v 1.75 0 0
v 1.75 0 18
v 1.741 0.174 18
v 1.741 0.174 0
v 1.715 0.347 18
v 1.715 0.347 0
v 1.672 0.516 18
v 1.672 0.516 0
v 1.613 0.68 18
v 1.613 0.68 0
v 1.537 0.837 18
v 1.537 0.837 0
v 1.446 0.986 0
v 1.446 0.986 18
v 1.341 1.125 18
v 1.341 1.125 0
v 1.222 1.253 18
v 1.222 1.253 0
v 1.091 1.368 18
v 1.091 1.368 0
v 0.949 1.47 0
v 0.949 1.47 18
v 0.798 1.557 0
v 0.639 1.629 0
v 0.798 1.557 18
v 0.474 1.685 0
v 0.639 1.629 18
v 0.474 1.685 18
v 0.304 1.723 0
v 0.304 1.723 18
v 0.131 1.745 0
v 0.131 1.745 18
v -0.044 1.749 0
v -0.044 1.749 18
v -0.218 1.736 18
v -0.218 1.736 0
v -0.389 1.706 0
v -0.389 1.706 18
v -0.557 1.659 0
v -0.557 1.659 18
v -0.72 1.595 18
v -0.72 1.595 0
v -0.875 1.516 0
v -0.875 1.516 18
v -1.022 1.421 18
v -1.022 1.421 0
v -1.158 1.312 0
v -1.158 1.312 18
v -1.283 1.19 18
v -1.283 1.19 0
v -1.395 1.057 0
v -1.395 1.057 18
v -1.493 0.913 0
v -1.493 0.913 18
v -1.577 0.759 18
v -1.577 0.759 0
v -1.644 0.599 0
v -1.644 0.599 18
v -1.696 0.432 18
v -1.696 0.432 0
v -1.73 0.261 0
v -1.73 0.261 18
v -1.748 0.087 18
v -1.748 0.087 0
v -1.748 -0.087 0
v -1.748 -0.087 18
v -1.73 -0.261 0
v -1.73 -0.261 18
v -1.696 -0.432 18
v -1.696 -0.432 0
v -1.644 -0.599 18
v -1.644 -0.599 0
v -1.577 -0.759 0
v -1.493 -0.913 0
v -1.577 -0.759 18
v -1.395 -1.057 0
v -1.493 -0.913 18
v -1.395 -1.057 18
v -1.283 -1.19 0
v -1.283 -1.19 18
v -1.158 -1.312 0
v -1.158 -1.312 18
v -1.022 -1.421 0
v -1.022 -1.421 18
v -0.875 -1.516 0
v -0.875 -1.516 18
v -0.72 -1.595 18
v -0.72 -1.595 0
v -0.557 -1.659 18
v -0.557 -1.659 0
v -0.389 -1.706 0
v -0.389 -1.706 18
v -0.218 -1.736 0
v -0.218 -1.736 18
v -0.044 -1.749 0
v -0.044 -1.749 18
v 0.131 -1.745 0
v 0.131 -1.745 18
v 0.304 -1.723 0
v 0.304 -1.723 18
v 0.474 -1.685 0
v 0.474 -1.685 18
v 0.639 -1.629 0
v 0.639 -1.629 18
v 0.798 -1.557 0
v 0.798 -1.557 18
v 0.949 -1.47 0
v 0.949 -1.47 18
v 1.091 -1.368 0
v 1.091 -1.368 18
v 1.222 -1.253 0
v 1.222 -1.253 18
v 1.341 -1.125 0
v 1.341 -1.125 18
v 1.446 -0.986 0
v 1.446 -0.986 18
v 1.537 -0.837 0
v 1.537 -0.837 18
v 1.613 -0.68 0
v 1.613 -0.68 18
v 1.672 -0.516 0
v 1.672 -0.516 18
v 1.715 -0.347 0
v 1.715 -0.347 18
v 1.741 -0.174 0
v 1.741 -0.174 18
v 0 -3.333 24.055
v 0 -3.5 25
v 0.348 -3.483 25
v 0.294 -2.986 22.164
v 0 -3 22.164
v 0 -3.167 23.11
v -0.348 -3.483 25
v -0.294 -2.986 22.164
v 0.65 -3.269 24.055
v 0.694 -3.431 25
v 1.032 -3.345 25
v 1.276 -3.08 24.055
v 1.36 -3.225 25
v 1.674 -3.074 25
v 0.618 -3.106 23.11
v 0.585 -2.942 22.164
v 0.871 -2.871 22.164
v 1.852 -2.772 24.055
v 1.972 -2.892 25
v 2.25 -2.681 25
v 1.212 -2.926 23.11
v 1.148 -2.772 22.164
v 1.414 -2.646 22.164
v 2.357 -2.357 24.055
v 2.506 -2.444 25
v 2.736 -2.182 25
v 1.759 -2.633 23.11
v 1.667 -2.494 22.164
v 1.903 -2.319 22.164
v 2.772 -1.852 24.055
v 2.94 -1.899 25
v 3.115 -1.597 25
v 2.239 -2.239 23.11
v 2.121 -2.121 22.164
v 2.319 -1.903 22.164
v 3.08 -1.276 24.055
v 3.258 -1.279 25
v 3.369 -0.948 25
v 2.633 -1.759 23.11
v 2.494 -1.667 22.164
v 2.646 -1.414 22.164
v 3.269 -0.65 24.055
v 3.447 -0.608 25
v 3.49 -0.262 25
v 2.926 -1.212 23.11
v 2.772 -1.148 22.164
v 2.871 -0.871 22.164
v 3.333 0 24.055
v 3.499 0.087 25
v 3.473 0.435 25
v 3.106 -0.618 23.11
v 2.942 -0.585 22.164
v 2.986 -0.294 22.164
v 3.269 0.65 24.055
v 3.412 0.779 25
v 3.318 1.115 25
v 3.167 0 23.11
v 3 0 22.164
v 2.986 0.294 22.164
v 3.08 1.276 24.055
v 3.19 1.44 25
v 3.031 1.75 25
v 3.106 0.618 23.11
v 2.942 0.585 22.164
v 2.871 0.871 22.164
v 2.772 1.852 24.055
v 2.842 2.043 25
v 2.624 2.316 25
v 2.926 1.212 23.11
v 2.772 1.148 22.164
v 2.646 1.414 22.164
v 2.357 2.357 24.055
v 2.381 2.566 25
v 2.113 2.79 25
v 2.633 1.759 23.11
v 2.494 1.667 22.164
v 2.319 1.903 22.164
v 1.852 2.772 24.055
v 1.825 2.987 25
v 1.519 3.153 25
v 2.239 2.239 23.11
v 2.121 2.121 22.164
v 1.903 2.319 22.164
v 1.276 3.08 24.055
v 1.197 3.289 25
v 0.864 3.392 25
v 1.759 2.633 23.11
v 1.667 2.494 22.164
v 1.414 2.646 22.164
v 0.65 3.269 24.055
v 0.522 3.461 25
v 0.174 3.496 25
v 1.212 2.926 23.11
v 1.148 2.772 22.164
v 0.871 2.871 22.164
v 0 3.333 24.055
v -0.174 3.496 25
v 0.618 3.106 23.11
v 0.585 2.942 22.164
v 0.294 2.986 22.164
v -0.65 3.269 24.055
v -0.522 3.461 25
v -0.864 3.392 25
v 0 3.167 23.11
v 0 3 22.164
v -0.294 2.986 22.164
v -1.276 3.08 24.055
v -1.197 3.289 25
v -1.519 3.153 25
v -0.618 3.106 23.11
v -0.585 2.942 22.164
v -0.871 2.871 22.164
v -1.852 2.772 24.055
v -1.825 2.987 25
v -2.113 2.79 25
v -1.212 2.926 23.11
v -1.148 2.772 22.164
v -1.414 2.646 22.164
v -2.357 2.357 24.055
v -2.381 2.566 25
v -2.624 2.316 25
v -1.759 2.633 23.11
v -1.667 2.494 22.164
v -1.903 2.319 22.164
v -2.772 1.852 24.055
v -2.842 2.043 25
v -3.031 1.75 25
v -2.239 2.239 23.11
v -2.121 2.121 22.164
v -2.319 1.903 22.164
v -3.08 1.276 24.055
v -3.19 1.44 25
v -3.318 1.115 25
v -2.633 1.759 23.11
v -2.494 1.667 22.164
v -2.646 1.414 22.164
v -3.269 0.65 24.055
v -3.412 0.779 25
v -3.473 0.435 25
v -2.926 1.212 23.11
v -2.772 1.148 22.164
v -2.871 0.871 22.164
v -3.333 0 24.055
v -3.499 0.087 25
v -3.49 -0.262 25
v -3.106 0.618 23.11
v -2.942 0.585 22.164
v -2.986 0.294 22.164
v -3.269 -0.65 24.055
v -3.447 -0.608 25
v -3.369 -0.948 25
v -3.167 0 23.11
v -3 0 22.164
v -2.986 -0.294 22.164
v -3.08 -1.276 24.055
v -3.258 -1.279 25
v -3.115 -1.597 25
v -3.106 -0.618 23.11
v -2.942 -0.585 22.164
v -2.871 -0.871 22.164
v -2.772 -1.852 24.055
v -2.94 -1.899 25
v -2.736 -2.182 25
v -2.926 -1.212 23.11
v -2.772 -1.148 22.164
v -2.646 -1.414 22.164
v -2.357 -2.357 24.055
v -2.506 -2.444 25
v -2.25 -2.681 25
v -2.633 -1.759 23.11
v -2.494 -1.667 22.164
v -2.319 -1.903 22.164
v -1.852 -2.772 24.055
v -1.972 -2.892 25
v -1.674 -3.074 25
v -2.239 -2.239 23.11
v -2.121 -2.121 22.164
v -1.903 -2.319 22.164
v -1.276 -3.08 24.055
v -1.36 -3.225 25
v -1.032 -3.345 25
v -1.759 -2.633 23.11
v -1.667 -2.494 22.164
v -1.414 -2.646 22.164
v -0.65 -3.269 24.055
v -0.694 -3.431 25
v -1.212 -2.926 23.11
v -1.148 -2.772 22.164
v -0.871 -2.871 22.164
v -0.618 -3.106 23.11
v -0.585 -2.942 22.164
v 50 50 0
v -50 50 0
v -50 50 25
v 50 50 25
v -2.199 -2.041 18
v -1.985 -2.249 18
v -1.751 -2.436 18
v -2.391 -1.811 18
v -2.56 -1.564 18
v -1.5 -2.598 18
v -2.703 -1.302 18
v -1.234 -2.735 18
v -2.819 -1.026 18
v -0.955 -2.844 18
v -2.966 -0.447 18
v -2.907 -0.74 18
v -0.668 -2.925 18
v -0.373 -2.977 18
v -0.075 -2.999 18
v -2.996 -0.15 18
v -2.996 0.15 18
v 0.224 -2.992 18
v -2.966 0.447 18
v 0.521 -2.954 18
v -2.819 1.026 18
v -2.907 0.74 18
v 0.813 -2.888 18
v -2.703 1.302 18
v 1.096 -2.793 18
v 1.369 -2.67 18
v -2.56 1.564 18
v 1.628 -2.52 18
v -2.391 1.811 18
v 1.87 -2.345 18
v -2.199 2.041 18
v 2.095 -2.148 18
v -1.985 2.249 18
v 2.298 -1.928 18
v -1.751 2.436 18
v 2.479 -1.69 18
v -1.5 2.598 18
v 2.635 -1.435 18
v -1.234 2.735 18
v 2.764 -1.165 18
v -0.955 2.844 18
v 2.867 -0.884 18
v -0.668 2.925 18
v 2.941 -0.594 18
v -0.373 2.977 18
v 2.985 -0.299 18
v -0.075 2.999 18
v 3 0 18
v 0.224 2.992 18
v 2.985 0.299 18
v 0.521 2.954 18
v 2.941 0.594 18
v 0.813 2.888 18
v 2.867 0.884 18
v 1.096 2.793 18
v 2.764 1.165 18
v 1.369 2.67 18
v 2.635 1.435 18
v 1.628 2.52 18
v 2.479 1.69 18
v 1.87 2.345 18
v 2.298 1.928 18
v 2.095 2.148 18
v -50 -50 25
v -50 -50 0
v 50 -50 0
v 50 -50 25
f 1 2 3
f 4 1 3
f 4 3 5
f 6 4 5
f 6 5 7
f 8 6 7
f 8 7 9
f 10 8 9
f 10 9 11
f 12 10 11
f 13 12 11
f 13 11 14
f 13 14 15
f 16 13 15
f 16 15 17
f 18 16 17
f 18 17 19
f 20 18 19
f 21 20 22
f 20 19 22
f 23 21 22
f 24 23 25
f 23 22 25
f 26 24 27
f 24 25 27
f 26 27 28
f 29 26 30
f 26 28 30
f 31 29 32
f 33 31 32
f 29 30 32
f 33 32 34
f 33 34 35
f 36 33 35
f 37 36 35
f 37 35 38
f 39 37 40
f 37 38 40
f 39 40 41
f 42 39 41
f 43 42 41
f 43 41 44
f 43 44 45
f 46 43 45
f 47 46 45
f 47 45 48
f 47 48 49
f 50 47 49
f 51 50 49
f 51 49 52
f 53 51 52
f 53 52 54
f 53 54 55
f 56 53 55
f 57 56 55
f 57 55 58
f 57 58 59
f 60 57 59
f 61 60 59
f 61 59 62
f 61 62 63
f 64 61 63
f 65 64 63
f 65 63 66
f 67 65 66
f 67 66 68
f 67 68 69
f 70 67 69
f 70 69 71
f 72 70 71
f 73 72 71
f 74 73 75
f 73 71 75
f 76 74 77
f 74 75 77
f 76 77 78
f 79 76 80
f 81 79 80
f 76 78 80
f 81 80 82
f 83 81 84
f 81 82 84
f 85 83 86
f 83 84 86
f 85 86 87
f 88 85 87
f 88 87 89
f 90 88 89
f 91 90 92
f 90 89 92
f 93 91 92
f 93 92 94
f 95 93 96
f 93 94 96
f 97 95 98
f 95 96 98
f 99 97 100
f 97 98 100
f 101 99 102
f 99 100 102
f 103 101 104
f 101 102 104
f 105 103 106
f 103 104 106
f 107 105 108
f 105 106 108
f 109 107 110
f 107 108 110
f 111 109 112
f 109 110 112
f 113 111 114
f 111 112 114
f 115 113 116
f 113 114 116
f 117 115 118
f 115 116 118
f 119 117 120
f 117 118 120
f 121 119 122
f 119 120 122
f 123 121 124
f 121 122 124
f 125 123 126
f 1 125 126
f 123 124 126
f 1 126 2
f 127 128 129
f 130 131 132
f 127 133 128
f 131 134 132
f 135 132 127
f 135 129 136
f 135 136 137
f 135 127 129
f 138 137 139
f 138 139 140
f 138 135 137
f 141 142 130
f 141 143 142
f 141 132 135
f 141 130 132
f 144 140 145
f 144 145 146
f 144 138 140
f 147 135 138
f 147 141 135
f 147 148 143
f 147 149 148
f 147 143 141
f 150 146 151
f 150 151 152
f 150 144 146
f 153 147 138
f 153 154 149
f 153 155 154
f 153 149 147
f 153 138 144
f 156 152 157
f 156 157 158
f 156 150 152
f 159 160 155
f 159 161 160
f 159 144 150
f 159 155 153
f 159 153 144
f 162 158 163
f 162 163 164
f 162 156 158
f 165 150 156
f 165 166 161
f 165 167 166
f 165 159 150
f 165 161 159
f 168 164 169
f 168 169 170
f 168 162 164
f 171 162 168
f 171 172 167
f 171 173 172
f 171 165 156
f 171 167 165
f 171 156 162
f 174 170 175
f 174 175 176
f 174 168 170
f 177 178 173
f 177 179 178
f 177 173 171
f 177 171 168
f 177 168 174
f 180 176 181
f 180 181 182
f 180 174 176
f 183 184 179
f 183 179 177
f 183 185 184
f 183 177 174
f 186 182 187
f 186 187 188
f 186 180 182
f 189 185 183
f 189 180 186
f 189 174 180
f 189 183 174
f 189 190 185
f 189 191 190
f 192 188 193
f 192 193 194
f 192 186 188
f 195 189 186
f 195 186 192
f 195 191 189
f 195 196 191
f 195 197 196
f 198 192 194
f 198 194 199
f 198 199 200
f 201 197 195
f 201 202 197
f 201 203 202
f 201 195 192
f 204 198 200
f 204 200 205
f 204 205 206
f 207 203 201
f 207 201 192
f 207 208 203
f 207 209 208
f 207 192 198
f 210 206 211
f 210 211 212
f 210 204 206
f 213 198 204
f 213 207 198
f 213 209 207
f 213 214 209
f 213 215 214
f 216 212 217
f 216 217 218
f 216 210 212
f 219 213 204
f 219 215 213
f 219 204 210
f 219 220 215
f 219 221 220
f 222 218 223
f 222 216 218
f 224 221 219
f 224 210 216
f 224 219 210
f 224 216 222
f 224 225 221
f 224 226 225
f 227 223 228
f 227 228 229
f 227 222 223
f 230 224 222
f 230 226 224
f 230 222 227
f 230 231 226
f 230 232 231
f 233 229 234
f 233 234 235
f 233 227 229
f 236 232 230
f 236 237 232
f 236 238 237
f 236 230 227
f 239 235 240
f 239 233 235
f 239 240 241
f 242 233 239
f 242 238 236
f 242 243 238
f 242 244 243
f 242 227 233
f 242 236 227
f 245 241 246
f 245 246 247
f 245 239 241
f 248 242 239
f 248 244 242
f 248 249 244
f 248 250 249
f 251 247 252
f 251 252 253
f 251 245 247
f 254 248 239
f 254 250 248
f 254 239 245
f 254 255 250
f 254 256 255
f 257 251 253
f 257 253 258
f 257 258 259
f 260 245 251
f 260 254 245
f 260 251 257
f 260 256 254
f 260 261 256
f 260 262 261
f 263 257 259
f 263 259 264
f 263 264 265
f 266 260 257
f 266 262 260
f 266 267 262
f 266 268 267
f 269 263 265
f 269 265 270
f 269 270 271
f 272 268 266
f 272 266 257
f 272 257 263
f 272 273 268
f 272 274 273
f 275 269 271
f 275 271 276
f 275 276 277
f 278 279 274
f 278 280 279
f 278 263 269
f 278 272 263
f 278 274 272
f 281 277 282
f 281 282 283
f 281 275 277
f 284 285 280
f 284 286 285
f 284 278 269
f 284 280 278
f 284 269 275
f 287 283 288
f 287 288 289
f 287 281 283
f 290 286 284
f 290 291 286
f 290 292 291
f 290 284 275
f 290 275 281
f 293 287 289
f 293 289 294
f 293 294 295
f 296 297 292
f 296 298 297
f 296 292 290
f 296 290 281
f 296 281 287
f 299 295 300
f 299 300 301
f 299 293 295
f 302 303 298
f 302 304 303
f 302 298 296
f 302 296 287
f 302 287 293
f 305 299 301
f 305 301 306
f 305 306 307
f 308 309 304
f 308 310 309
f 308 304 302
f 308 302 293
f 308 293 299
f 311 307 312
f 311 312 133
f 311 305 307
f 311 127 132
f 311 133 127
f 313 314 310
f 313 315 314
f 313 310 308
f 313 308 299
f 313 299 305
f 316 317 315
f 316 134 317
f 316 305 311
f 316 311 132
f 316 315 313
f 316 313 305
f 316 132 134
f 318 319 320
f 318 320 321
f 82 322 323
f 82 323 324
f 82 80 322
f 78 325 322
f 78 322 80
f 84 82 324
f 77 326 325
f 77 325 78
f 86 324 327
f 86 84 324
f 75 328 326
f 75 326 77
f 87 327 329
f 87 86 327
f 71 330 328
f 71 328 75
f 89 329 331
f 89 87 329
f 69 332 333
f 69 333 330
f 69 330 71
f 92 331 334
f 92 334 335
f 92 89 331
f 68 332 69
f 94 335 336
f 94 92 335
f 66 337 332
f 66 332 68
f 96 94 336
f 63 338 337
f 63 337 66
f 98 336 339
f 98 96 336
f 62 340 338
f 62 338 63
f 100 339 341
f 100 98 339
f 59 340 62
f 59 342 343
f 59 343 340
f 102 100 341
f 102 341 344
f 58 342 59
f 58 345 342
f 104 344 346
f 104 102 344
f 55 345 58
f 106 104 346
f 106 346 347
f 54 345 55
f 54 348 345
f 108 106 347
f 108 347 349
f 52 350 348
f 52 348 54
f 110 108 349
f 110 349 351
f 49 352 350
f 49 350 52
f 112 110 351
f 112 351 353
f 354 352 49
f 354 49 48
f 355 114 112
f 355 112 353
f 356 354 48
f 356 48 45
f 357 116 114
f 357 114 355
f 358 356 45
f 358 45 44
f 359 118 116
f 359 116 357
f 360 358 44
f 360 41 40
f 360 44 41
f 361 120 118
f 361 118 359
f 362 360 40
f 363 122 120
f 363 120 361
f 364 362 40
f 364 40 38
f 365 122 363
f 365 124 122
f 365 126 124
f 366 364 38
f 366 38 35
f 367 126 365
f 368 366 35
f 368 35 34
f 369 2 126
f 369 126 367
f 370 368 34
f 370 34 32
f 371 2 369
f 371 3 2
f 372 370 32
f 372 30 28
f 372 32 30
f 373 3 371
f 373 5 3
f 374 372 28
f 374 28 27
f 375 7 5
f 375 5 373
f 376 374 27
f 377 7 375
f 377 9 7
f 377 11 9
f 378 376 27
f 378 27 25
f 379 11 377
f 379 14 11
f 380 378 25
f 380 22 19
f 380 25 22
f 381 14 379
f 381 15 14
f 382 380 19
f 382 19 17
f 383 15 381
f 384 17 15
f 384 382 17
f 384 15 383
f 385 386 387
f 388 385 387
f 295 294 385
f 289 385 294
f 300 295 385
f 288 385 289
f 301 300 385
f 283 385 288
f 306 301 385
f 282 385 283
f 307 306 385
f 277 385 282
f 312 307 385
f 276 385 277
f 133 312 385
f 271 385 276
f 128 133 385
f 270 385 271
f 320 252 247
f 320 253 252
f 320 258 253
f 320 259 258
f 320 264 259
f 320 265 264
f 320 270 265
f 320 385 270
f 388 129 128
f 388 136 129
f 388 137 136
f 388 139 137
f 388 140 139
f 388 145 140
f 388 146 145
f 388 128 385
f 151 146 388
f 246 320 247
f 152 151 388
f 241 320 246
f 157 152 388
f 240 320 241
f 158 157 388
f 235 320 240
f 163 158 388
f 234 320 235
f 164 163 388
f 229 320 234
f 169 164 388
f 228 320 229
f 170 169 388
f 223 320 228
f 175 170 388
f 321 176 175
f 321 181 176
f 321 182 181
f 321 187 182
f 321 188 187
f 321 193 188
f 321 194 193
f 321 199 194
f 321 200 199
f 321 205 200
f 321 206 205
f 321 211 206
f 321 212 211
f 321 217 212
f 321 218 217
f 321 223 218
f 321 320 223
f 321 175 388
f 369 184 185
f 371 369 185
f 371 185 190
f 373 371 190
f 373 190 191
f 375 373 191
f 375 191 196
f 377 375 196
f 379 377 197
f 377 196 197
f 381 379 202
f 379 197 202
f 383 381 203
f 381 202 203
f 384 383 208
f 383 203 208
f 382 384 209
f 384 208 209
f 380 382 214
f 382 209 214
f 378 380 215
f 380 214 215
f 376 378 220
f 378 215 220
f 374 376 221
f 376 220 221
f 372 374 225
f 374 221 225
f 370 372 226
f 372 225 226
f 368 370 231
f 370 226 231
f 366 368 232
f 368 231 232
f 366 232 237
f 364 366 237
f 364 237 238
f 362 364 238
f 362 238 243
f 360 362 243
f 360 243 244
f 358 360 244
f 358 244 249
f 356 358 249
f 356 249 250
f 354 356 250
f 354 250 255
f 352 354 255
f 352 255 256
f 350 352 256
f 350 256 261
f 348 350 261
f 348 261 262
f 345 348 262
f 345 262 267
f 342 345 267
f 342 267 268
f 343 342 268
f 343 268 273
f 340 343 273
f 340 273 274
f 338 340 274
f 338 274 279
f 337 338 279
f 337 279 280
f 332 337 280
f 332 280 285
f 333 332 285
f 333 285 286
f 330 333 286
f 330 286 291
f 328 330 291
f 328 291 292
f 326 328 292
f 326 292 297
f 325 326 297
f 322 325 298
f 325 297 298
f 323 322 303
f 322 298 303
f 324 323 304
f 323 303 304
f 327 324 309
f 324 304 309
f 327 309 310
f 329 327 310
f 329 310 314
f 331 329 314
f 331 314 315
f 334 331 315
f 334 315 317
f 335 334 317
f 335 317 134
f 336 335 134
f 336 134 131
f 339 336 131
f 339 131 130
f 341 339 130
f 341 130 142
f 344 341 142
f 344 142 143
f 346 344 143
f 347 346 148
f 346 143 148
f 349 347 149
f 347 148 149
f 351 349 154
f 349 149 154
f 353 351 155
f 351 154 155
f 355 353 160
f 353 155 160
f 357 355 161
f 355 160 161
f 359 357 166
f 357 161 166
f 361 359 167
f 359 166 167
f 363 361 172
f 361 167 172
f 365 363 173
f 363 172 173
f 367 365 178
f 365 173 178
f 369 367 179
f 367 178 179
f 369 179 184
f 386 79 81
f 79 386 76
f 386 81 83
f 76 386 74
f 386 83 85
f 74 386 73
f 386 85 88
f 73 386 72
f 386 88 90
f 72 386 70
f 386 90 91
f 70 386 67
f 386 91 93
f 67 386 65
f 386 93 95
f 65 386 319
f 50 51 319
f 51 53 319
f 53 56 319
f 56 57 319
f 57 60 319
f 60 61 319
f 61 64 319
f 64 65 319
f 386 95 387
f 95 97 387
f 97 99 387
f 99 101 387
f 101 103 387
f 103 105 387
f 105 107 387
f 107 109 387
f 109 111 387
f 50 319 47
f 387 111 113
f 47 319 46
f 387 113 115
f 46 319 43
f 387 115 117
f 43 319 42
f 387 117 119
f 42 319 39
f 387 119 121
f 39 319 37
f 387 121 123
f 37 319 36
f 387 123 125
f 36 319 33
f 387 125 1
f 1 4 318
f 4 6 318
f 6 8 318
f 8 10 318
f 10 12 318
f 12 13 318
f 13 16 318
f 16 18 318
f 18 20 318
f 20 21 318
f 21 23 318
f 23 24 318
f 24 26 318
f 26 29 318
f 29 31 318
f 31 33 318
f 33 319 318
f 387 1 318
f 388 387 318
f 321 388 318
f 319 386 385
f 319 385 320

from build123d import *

# Parameters (mm, degrees)
F0_W     = 100
F0_H     = 100
F1_DEPTH = 25
F2_R     = 3
F3_DEPTH = 7
F4_R     = 1.75
F5_DEPTH = 25


with BuildPart() as f1:
    # F0 (on Top) → F1 (new body)
    with BuildSketch(Plane.XY):
        Rectangle(F0_W, F0_H)
    extrude(amount=F1_DEPTH)

    # F2 (on face) → F3 (cut)
    with BuildSketch(Plane.XY.offset(25)):
        Circle(F2_R)
    extrude(amount=-F3_DEPTH, mode=Mode.SUBTRACT)

    # F4 (on face) → F5 (cut)
    with BuildSketch(Plane.XY.offset(18)):
        Circle(F4_R)
    extrude(amount=-F5_DEPTH, mode=Mode.SUBTRACT)

    # F6 (on Right) → F7 (revolve, cut)
    with BuildSketch(Plane.YZ):
        Polygon((0, 18), (0, 25), (-3.5, 25), (-2.265711, 18), align=None)
    revolve(axis=Axis((0, 0, 21.5), (0, 0, 1)), mode=Mode.SUBTRACT)


solid = f1.part
